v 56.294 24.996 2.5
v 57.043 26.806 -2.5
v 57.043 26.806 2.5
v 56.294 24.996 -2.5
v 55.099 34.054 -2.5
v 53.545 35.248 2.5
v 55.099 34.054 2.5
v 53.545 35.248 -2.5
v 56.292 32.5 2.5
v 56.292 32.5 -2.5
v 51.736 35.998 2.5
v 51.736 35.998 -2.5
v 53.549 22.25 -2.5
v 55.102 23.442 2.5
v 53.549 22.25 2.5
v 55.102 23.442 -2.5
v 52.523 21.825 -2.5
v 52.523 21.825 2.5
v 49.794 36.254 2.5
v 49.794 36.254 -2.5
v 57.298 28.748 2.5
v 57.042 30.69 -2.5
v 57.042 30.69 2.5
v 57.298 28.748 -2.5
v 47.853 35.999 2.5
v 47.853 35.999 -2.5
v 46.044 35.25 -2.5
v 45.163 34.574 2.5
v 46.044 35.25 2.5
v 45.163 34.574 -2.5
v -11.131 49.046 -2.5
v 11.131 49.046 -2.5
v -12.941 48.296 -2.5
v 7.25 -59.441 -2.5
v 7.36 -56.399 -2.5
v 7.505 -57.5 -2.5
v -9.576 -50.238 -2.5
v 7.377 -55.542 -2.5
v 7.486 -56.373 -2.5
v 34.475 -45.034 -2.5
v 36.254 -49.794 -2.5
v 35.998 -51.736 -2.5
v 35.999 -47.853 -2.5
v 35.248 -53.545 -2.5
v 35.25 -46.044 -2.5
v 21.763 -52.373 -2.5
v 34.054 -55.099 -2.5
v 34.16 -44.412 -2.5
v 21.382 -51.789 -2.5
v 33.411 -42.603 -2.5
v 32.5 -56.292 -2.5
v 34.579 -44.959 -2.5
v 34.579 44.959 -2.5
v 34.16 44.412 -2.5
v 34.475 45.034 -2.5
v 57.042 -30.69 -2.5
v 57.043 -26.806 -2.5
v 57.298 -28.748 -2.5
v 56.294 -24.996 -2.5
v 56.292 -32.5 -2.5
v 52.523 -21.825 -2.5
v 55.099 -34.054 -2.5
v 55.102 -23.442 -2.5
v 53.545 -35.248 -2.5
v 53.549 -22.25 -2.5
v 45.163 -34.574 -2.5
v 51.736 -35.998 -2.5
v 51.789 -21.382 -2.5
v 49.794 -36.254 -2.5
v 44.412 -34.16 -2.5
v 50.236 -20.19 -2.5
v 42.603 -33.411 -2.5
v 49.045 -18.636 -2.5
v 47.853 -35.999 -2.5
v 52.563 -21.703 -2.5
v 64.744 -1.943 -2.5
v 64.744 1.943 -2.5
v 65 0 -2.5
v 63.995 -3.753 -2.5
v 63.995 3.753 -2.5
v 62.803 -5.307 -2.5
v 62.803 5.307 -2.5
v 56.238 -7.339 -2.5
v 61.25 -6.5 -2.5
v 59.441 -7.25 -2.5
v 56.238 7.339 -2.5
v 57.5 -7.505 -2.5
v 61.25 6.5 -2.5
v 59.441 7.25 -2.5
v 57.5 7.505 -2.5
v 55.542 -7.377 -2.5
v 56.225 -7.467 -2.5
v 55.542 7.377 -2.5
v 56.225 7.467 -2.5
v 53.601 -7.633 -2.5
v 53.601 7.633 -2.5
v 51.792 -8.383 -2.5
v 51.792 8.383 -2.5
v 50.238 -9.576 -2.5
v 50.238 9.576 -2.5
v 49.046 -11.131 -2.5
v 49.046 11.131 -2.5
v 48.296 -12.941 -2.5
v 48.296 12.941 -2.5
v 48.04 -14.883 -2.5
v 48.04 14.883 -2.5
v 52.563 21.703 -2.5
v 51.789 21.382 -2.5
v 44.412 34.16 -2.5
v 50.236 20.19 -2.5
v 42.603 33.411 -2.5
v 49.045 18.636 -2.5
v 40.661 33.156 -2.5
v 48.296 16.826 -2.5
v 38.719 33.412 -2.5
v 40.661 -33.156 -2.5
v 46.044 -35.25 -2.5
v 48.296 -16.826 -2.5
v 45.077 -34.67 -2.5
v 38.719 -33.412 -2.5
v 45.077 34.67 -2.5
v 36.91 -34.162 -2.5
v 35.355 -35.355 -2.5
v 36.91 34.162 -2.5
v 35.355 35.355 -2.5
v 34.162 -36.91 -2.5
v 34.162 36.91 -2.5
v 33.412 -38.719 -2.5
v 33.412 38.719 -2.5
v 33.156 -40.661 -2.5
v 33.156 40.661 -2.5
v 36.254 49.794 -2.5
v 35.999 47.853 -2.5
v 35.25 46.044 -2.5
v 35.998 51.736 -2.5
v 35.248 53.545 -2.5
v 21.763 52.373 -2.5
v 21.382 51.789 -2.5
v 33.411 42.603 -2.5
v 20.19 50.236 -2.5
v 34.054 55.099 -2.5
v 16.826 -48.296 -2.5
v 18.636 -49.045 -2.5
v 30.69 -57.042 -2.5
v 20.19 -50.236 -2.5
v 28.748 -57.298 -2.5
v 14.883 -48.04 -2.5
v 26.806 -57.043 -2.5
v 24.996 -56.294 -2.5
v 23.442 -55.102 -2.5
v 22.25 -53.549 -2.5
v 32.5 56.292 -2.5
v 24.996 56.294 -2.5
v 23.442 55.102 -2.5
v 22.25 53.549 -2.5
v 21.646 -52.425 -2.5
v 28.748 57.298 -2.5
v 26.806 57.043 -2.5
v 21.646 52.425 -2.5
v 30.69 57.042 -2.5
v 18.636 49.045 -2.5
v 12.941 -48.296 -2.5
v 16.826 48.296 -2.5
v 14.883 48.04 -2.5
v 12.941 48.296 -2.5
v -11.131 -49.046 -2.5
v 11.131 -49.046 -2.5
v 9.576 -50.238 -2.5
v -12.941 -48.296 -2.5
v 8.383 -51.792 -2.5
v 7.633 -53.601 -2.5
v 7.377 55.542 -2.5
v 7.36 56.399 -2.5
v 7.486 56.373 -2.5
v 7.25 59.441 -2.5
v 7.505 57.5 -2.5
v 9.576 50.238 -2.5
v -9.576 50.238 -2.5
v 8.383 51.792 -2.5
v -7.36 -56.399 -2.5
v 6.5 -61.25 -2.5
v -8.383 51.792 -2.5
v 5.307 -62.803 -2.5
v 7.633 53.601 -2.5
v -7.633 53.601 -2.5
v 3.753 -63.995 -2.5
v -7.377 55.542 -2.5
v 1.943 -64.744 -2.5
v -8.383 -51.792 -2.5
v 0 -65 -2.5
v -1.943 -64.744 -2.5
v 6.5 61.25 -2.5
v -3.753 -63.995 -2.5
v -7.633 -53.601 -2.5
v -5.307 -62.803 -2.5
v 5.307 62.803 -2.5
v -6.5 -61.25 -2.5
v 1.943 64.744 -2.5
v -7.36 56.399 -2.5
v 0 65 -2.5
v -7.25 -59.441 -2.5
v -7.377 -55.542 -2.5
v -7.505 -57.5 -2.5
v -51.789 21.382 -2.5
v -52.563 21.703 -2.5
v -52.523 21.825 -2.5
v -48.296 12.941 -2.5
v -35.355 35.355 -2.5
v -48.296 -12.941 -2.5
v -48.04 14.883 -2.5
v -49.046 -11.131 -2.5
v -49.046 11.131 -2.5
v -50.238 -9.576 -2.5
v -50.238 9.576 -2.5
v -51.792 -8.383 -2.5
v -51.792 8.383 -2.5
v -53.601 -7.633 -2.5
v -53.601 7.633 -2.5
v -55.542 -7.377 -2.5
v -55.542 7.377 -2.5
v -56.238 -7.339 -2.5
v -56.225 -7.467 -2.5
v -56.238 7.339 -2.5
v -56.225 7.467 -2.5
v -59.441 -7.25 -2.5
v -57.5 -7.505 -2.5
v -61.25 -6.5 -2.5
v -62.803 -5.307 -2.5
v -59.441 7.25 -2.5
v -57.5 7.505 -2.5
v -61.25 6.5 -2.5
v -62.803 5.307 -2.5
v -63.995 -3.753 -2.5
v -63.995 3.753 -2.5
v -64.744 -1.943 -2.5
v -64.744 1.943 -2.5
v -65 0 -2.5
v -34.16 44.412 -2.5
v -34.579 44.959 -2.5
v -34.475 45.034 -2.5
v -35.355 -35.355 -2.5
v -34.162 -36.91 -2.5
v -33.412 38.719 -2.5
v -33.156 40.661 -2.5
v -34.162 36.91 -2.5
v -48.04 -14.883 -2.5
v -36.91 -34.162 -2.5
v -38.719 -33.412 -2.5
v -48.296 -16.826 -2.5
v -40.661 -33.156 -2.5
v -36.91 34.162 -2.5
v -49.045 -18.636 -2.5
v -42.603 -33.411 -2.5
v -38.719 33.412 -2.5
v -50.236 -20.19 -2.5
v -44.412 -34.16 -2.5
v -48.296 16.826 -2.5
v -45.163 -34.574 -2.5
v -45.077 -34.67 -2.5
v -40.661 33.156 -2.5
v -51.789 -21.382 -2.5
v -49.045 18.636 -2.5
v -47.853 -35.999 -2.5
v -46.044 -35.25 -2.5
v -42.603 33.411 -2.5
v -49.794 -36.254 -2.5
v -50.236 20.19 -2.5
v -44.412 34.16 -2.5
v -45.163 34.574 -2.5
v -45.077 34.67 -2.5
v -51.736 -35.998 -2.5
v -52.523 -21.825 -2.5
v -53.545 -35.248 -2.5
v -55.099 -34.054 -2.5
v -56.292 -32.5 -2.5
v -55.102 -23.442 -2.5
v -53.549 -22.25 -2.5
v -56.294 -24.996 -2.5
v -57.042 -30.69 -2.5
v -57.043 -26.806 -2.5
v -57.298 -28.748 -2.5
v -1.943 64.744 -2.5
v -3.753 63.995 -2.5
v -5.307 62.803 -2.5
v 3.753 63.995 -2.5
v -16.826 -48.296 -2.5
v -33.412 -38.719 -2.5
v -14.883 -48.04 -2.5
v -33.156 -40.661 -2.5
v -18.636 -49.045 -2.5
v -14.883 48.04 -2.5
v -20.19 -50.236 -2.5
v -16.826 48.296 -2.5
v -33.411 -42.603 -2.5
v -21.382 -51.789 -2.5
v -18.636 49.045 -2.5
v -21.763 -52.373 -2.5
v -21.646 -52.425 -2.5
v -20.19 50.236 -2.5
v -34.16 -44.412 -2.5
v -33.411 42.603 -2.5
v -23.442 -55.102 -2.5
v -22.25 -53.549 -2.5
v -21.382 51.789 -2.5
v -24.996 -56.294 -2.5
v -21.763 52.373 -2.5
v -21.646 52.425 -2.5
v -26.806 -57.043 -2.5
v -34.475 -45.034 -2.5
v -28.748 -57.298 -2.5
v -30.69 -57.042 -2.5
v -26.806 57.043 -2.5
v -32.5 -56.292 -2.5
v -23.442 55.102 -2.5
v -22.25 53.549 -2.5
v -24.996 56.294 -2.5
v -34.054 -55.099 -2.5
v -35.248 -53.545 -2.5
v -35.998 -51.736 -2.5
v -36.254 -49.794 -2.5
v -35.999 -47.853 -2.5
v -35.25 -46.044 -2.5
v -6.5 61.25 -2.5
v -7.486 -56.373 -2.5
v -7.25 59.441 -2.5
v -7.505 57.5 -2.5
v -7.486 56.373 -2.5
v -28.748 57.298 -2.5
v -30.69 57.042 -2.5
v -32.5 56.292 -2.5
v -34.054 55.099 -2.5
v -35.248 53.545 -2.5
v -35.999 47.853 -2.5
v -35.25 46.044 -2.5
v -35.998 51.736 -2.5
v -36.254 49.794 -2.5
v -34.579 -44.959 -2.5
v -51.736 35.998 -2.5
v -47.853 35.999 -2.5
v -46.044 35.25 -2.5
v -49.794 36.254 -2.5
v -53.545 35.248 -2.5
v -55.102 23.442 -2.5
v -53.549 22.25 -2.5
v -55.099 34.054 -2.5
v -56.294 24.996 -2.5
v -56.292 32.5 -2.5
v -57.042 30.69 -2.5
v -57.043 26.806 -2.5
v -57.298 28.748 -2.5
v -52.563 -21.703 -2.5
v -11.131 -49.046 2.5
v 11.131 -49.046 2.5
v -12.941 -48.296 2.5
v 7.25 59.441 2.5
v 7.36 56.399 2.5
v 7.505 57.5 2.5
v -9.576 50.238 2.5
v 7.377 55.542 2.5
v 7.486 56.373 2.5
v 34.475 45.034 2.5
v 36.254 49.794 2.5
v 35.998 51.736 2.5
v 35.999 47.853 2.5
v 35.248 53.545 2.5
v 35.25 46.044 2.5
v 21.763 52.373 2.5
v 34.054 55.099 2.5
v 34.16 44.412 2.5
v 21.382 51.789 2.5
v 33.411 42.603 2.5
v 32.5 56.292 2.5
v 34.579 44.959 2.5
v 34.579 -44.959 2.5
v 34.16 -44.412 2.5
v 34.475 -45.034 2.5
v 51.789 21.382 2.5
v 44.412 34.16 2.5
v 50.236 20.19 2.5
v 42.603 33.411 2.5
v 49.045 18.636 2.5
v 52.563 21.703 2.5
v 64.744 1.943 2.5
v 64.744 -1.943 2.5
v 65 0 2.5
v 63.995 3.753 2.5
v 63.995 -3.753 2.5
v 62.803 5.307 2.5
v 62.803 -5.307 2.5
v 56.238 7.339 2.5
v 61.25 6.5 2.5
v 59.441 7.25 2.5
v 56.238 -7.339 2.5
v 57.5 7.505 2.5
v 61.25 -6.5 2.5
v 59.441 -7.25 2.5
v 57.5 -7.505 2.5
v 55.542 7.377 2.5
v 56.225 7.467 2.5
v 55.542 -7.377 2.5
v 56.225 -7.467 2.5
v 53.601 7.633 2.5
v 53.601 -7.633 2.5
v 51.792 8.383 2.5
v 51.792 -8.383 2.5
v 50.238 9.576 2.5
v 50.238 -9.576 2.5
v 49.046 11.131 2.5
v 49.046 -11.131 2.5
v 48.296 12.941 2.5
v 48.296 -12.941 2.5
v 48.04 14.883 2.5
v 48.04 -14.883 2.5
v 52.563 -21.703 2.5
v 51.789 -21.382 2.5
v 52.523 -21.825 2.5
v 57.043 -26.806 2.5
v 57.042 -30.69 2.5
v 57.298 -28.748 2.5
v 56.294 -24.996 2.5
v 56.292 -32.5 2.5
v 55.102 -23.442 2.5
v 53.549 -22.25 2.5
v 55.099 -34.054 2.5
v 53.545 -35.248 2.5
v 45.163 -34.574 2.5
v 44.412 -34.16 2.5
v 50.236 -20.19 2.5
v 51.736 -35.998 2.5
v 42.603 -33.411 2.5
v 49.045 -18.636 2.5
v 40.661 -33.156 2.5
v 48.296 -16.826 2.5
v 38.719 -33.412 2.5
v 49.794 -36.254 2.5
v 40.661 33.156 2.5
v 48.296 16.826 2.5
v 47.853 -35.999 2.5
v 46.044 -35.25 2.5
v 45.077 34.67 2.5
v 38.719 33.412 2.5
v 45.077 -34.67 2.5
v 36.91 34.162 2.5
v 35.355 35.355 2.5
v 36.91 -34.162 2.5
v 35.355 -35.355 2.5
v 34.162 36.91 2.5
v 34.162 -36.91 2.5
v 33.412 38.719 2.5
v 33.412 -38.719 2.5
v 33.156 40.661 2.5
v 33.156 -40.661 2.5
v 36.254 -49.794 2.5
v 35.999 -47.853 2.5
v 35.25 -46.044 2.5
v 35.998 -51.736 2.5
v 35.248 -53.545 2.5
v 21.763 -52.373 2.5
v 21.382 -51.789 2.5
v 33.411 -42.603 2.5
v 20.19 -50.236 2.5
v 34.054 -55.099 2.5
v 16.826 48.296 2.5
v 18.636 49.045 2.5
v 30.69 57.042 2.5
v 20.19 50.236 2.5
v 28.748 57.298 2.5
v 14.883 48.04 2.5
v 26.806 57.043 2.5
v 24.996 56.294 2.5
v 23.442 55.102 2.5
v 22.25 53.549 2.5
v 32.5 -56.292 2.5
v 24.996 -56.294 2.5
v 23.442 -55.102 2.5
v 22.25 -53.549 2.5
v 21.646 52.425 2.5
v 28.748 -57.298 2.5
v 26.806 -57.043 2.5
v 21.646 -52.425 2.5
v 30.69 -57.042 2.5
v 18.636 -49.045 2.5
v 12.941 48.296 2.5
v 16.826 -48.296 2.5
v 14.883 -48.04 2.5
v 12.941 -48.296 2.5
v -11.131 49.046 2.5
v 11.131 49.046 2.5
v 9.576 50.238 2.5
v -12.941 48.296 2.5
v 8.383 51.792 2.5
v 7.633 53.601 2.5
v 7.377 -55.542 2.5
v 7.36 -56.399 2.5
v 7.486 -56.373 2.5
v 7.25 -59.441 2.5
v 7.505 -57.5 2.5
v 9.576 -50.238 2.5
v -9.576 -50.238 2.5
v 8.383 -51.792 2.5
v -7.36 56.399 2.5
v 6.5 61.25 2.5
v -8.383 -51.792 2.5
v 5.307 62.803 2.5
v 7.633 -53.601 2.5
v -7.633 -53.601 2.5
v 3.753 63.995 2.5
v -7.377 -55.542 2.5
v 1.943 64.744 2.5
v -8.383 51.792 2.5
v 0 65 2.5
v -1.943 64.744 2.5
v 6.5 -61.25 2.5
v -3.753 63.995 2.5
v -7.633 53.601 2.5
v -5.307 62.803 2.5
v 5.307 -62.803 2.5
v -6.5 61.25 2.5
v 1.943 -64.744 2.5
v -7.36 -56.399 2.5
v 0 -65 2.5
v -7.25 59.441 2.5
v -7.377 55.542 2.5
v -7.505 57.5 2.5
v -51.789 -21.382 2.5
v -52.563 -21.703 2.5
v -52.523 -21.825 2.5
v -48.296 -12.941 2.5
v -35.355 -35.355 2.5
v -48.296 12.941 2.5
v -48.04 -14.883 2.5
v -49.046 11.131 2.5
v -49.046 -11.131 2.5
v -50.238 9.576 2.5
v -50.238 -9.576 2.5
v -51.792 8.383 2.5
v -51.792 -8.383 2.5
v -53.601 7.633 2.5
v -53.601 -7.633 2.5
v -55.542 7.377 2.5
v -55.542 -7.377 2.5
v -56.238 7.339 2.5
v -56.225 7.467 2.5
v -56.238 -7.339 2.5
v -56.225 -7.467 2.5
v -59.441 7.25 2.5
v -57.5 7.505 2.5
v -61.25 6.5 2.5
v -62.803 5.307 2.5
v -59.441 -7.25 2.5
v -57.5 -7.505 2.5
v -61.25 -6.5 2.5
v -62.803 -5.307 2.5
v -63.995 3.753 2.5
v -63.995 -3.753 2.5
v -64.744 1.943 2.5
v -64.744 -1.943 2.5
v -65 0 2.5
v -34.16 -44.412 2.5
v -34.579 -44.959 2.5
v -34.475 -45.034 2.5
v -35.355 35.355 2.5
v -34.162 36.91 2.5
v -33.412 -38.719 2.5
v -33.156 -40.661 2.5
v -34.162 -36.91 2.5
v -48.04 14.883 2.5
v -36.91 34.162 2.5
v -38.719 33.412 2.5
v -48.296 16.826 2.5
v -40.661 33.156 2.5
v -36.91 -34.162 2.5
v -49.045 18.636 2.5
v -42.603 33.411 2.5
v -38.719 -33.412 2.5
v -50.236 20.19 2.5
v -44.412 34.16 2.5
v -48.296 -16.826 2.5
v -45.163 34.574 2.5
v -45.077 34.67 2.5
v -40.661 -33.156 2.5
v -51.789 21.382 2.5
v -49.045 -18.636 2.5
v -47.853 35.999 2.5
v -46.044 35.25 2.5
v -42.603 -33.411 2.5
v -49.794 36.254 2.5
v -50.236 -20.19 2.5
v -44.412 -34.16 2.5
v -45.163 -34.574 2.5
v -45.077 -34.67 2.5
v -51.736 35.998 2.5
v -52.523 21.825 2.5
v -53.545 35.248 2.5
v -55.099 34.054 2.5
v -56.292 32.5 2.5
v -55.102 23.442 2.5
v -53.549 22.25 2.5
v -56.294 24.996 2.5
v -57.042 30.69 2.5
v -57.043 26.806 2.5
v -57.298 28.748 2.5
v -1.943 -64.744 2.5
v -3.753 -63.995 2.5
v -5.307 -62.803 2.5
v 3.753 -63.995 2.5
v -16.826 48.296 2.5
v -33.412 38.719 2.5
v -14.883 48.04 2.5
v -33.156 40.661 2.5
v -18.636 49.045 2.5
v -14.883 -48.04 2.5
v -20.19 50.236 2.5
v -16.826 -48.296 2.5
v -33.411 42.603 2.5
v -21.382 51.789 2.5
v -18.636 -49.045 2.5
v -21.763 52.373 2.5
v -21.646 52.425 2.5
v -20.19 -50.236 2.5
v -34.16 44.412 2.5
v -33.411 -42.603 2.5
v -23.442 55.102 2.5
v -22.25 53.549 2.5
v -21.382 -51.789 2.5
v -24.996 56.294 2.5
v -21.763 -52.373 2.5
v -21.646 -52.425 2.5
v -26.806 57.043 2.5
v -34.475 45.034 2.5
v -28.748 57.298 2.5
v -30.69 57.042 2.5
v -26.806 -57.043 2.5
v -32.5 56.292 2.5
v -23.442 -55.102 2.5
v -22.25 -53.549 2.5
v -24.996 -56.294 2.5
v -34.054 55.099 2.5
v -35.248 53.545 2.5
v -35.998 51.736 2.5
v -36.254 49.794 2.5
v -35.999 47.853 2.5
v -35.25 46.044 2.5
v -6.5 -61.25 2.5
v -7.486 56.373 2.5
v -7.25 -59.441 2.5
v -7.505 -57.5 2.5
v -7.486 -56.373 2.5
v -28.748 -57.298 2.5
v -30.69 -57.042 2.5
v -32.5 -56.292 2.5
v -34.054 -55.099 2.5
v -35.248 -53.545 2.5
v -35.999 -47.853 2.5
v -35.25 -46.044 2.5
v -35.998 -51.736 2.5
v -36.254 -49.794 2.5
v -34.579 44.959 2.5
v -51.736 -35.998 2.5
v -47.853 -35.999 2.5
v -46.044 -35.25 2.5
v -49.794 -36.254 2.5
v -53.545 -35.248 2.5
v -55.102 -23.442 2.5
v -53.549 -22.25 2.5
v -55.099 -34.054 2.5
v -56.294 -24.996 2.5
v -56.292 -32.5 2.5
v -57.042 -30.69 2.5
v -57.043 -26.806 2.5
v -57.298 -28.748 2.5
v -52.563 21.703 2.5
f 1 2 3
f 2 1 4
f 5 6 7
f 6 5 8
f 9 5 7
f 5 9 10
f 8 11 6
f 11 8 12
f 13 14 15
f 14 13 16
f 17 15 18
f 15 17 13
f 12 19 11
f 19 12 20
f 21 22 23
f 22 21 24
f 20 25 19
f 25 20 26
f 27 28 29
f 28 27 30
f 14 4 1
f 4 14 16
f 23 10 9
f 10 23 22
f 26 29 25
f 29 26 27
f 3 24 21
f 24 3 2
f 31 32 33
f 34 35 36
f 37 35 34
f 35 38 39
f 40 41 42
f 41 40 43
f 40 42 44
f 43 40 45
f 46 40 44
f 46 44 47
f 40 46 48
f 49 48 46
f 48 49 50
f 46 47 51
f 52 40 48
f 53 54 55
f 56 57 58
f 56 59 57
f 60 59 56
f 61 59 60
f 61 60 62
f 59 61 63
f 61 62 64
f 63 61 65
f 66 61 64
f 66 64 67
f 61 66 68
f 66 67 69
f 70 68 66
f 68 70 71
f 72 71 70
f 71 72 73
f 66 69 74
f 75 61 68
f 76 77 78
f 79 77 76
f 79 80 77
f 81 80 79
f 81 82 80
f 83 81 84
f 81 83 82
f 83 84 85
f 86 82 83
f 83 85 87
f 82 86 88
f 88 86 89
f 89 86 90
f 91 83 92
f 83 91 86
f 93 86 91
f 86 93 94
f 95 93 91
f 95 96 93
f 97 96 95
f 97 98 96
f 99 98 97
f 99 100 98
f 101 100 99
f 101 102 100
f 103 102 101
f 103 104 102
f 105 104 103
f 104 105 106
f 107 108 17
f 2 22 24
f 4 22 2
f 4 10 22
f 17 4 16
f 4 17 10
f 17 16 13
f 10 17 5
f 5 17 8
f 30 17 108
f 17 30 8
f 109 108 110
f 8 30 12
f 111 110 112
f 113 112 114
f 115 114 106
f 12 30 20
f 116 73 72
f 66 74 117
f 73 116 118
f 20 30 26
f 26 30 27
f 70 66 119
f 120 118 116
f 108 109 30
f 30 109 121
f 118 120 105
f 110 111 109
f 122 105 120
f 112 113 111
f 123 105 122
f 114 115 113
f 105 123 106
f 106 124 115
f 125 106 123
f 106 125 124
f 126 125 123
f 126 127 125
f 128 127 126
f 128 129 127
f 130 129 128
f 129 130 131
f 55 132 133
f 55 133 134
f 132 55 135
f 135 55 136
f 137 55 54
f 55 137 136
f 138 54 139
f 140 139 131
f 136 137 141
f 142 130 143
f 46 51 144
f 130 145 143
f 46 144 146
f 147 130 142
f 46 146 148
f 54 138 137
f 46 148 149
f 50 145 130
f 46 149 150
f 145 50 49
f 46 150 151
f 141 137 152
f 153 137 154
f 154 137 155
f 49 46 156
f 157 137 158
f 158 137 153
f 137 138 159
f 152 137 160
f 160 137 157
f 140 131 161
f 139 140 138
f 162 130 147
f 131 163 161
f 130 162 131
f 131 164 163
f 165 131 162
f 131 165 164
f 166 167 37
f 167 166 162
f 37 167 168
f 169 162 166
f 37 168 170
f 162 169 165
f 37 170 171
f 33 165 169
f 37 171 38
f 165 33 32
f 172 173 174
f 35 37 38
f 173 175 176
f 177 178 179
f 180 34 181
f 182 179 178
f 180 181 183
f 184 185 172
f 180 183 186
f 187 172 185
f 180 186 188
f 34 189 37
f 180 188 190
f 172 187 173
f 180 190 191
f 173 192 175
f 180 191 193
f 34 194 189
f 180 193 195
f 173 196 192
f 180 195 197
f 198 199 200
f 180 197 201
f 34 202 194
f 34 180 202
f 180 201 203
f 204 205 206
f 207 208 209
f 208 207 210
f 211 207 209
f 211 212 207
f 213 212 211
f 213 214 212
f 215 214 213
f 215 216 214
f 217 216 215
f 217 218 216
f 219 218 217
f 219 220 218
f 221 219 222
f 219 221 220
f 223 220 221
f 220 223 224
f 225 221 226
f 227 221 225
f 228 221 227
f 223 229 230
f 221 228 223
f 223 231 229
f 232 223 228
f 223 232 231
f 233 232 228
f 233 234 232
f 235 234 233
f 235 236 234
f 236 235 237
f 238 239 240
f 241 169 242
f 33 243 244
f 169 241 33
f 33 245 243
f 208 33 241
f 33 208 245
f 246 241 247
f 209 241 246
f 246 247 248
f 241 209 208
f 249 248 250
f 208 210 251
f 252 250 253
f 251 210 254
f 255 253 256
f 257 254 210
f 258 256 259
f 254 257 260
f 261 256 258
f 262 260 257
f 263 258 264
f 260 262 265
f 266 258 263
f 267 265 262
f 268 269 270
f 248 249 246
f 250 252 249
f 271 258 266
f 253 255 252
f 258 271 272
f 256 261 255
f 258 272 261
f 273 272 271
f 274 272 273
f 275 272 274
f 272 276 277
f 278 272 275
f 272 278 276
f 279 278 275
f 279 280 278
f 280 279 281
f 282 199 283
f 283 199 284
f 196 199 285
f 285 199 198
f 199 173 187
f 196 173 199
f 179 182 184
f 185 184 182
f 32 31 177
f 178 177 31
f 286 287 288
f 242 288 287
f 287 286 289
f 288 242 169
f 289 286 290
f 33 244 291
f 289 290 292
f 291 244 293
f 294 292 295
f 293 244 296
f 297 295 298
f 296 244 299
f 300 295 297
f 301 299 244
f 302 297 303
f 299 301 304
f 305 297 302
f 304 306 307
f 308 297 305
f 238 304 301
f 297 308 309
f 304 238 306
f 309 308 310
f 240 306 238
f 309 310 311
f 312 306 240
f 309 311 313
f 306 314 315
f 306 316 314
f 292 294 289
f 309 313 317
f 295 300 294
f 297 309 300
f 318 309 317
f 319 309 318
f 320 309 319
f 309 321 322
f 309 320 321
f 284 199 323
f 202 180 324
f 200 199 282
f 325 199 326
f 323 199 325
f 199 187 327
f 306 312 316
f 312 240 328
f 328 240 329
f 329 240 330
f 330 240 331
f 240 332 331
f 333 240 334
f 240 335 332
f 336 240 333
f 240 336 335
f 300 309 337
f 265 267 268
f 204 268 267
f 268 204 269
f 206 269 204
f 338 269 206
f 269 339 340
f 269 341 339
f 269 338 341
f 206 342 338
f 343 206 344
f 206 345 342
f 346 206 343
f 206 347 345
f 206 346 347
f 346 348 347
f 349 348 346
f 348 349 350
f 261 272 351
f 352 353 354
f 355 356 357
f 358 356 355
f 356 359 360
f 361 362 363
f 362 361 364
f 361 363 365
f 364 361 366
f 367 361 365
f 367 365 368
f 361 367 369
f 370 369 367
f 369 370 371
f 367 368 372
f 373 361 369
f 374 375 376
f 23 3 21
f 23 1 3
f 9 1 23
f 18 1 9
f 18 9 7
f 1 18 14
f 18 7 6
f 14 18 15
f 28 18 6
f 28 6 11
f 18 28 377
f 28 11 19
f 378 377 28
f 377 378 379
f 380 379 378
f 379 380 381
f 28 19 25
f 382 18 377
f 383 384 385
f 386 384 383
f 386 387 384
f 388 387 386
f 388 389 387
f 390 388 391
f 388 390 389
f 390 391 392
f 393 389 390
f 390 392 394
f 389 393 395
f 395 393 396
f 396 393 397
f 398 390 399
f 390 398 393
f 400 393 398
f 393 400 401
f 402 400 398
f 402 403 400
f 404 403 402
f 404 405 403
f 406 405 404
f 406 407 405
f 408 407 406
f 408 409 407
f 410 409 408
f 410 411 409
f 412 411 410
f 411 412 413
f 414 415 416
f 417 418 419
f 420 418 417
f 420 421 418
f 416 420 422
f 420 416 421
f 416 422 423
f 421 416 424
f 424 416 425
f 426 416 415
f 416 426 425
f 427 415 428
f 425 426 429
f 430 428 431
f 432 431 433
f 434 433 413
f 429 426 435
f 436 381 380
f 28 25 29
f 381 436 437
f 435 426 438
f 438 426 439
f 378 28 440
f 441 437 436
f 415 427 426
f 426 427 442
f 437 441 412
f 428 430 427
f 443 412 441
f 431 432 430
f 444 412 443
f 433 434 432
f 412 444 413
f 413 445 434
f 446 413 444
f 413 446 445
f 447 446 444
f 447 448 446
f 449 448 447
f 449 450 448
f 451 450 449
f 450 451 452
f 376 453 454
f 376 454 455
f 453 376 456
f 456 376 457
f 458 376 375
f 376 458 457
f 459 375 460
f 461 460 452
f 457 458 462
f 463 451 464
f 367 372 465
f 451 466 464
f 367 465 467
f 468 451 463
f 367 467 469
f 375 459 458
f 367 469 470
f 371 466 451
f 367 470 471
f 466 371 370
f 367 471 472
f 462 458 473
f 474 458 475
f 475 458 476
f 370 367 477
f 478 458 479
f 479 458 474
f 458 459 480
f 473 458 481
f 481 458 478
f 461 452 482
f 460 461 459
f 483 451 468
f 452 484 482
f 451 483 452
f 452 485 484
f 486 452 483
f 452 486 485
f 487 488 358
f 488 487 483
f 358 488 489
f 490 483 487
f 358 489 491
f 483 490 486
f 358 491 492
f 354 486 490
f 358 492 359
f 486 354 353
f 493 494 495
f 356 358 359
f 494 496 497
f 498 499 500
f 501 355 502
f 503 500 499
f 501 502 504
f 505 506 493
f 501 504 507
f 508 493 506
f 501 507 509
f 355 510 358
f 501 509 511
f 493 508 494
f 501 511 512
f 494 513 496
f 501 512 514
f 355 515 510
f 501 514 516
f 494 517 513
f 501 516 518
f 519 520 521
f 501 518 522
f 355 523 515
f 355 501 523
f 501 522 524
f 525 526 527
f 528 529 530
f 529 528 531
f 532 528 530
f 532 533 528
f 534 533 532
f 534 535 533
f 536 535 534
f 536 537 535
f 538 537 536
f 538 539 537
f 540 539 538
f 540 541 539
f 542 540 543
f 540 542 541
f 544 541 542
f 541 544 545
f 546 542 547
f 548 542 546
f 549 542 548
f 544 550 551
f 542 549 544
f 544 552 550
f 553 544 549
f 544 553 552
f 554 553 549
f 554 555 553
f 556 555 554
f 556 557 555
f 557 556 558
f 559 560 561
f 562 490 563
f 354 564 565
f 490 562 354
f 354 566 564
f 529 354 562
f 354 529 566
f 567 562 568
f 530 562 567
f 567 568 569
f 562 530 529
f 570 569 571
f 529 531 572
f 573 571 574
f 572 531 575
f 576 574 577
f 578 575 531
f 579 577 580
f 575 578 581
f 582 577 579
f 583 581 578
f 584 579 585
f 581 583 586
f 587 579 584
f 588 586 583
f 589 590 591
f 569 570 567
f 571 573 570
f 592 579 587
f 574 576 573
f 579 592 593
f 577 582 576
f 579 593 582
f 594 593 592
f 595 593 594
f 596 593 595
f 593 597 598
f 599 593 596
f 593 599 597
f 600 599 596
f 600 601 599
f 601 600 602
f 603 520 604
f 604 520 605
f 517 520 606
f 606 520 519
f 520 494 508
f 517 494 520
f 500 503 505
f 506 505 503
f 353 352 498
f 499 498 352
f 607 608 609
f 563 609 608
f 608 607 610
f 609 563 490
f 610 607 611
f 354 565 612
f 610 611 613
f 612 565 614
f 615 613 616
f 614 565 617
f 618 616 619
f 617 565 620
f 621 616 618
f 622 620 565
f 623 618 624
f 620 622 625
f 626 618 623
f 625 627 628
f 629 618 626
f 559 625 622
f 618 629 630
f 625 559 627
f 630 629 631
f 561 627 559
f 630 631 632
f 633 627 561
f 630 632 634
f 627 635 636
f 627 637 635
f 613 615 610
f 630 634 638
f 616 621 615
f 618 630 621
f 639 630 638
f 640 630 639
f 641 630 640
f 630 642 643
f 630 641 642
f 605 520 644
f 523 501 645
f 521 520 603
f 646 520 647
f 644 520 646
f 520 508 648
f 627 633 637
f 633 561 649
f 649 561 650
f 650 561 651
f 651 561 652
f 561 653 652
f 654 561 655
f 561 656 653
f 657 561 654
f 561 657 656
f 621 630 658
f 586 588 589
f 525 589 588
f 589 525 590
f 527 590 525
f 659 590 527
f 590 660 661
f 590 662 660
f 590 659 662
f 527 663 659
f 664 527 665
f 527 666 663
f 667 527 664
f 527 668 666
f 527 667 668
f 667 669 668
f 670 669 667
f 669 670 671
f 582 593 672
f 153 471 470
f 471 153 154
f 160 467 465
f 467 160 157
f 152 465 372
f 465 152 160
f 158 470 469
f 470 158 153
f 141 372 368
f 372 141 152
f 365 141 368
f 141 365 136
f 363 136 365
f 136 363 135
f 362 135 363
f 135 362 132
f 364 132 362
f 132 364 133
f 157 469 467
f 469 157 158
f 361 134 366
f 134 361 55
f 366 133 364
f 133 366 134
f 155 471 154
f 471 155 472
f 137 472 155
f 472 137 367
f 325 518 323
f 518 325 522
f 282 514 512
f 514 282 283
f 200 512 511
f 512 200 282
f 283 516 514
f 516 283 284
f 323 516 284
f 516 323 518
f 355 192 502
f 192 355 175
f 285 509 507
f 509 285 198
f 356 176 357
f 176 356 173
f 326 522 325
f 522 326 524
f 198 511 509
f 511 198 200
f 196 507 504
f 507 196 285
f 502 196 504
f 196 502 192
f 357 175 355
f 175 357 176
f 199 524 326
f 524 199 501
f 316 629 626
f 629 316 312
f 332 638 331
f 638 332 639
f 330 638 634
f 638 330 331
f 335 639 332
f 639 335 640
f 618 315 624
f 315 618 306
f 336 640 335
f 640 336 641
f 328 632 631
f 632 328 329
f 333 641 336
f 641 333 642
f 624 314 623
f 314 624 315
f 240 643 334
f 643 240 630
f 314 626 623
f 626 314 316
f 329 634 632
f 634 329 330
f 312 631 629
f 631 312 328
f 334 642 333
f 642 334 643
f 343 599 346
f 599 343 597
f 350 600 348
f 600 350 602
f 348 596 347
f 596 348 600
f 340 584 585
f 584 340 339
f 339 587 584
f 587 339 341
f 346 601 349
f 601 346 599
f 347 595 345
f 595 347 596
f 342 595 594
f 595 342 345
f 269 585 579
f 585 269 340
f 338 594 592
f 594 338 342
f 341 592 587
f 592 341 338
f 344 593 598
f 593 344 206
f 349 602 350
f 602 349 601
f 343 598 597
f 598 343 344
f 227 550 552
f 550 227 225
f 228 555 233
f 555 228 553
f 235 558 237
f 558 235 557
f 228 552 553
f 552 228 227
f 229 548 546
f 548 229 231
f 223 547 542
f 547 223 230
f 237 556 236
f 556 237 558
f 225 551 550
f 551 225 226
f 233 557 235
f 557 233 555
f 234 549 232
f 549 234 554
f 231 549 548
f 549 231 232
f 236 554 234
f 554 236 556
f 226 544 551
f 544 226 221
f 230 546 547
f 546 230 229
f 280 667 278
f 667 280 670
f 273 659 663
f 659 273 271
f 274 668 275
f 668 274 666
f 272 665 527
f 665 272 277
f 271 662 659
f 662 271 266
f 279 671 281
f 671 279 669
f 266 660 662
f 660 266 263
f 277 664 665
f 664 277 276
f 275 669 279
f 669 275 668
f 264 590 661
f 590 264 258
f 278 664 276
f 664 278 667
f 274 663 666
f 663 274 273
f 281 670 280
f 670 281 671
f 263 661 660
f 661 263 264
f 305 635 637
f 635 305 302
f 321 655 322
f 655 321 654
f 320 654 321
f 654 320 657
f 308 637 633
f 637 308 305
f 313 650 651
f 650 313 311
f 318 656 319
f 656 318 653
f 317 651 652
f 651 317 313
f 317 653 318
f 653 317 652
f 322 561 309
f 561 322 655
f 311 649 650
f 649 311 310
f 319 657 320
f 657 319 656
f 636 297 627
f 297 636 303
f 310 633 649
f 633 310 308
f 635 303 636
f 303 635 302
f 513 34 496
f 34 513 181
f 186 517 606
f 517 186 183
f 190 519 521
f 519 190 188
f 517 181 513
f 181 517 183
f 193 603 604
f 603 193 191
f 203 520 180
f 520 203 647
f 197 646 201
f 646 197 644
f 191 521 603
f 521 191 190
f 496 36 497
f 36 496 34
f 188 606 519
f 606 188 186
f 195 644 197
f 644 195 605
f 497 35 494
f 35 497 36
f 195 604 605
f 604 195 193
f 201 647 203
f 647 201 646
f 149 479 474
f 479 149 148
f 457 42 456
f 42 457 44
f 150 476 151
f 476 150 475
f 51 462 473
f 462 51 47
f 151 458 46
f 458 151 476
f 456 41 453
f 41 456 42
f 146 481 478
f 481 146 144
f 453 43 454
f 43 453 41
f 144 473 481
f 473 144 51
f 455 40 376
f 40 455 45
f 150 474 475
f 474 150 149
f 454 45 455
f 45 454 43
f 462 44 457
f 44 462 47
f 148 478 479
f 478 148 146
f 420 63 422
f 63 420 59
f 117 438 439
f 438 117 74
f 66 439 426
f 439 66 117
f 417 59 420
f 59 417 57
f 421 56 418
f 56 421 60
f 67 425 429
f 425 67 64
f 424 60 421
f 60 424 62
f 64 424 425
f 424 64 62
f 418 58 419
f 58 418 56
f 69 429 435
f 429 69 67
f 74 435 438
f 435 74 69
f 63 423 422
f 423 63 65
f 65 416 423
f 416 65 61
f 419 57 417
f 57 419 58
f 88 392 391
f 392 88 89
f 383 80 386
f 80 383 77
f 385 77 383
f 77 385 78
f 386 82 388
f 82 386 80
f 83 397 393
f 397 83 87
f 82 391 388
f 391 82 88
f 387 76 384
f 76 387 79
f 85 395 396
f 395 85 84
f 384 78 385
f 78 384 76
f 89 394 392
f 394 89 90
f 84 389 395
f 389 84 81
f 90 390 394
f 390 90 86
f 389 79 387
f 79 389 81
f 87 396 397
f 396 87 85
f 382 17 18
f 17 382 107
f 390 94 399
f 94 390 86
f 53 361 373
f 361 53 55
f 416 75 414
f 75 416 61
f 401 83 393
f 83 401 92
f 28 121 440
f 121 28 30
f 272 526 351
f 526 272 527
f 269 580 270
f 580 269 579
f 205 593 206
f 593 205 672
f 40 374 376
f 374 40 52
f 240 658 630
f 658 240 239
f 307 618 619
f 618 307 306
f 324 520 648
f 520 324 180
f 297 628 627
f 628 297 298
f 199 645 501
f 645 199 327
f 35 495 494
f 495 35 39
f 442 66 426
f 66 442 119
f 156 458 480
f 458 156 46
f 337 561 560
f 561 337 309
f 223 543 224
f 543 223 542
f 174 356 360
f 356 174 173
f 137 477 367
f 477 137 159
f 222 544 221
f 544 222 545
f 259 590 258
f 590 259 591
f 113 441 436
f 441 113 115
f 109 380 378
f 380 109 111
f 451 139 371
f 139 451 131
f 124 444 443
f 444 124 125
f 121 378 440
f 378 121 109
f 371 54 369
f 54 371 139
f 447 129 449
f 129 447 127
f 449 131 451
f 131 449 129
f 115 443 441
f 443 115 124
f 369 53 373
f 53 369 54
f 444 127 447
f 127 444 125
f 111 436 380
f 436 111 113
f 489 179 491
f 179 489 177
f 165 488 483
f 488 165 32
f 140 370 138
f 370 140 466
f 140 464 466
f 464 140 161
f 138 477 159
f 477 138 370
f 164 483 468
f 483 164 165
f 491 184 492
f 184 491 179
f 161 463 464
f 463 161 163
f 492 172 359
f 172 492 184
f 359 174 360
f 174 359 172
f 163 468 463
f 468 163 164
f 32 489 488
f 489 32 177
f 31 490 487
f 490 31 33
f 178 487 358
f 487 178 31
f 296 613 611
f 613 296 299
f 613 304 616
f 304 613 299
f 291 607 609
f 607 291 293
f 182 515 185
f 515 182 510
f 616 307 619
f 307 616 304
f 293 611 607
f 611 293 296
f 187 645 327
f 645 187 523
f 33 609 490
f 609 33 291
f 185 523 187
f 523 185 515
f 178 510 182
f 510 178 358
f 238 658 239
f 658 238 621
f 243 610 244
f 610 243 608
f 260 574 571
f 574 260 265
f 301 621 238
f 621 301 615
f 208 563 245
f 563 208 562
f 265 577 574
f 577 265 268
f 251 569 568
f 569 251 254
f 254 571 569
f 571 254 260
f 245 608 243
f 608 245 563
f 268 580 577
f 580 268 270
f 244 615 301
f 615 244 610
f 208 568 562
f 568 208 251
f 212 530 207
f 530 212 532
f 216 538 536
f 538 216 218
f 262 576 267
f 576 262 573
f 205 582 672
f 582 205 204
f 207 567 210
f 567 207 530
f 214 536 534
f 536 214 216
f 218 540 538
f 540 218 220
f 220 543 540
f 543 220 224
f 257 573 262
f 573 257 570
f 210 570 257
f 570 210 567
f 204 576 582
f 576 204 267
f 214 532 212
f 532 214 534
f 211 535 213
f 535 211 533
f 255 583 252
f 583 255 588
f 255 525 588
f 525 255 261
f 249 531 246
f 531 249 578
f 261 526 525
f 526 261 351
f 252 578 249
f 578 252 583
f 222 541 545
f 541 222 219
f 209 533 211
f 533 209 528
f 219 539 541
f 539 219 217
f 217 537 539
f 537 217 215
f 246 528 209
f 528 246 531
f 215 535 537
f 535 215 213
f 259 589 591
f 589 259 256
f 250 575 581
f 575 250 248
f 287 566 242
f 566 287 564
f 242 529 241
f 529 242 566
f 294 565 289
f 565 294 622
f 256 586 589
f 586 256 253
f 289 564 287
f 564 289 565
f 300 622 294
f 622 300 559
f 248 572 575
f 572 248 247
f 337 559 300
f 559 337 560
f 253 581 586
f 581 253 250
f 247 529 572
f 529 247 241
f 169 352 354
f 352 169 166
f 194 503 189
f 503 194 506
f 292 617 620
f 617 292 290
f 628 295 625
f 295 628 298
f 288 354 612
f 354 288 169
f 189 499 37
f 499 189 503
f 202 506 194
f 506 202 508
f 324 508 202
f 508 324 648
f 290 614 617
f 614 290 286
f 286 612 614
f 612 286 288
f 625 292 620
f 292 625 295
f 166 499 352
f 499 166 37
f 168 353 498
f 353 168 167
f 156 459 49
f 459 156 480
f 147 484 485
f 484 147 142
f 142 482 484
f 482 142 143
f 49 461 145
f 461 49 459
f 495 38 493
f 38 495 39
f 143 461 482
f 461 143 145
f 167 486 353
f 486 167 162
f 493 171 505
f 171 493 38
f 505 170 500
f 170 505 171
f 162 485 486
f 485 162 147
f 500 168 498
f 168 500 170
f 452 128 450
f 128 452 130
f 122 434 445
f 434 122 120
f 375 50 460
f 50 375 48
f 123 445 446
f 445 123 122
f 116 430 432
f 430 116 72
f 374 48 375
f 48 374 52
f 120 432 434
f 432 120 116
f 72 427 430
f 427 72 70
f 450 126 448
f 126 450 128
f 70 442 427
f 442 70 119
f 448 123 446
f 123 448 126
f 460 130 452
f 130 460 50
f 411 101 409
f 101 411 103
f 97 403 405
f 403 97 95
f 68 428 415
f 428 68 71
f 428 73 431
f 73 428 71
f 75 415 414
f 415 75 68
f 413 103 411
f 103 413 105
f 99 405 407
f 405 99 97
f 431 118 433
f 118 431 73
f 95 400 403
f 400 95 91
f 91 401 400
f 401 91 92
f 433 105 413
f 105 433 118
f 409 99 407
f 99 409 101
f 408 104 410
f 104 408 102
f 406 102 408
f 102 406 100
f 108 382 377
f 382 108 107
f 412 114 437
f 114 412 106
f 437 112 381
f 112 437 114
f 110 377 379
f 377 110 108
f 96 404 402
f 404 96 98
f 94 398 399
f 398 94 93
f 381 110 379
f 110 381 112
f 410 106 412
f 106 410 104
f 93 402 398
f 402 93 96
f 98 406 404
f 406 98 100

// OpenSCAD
//Correspond to the distance from the center of the peace to the inner groove
minRadius=50;

//Correspond to the distance from the center of the peace to the outer groove
maxRadius=65;

//It is the thickness of the peace
thick=5;

//The number of grooves on the edge
Grooves=12;


Handle(minRadius,maxRadius,thick,Grooves);

module Handle(inRadius=50, outRadius=55, Thickness=5, grooves=12){
	angle=360.0/grooves;
	halfAngle=angle/2.0 ;
	quaterAngle=halfAngle/2;
	GrooveA=(outRadius-inRadius)/2.0 ;
	tgRadius=inRadius+GrooveA;
	X0=pow(GrooveA,2)/tgRadius;
	Y0=(1-pow(GrooveA/tgRadius,2))*(tgRadius*tan(quaterAngle));
	GrooveB=Y0/sqrt(1-pow(X0/GrooveA,2));
	hRadius=sqrt(pow(tgRadius-X0,2)+pow(Y0,2))   ;
	difference(){ 
		union(){
			cylinder(h=Thickness, r=hRadius, center=true);
			for (i=[1:grooves]){
				rotate(i*angle) translate([tgRadius,0,0]) scale([GrooveA/GrooveB,1,1]) cylinder(h=Thickness, r=GrooveB, center=true);
			}
		}
		union(){
			for (i=[1:grooves]){
				rotate(i*angle+halfAngle) translate([tgRadius,0,0]) scale([GrooveA/GrooveB,1,1]) cylinder(h=Thickness*1.01, r=GrooveB, center=true);
				
			}
		}
	}
}
